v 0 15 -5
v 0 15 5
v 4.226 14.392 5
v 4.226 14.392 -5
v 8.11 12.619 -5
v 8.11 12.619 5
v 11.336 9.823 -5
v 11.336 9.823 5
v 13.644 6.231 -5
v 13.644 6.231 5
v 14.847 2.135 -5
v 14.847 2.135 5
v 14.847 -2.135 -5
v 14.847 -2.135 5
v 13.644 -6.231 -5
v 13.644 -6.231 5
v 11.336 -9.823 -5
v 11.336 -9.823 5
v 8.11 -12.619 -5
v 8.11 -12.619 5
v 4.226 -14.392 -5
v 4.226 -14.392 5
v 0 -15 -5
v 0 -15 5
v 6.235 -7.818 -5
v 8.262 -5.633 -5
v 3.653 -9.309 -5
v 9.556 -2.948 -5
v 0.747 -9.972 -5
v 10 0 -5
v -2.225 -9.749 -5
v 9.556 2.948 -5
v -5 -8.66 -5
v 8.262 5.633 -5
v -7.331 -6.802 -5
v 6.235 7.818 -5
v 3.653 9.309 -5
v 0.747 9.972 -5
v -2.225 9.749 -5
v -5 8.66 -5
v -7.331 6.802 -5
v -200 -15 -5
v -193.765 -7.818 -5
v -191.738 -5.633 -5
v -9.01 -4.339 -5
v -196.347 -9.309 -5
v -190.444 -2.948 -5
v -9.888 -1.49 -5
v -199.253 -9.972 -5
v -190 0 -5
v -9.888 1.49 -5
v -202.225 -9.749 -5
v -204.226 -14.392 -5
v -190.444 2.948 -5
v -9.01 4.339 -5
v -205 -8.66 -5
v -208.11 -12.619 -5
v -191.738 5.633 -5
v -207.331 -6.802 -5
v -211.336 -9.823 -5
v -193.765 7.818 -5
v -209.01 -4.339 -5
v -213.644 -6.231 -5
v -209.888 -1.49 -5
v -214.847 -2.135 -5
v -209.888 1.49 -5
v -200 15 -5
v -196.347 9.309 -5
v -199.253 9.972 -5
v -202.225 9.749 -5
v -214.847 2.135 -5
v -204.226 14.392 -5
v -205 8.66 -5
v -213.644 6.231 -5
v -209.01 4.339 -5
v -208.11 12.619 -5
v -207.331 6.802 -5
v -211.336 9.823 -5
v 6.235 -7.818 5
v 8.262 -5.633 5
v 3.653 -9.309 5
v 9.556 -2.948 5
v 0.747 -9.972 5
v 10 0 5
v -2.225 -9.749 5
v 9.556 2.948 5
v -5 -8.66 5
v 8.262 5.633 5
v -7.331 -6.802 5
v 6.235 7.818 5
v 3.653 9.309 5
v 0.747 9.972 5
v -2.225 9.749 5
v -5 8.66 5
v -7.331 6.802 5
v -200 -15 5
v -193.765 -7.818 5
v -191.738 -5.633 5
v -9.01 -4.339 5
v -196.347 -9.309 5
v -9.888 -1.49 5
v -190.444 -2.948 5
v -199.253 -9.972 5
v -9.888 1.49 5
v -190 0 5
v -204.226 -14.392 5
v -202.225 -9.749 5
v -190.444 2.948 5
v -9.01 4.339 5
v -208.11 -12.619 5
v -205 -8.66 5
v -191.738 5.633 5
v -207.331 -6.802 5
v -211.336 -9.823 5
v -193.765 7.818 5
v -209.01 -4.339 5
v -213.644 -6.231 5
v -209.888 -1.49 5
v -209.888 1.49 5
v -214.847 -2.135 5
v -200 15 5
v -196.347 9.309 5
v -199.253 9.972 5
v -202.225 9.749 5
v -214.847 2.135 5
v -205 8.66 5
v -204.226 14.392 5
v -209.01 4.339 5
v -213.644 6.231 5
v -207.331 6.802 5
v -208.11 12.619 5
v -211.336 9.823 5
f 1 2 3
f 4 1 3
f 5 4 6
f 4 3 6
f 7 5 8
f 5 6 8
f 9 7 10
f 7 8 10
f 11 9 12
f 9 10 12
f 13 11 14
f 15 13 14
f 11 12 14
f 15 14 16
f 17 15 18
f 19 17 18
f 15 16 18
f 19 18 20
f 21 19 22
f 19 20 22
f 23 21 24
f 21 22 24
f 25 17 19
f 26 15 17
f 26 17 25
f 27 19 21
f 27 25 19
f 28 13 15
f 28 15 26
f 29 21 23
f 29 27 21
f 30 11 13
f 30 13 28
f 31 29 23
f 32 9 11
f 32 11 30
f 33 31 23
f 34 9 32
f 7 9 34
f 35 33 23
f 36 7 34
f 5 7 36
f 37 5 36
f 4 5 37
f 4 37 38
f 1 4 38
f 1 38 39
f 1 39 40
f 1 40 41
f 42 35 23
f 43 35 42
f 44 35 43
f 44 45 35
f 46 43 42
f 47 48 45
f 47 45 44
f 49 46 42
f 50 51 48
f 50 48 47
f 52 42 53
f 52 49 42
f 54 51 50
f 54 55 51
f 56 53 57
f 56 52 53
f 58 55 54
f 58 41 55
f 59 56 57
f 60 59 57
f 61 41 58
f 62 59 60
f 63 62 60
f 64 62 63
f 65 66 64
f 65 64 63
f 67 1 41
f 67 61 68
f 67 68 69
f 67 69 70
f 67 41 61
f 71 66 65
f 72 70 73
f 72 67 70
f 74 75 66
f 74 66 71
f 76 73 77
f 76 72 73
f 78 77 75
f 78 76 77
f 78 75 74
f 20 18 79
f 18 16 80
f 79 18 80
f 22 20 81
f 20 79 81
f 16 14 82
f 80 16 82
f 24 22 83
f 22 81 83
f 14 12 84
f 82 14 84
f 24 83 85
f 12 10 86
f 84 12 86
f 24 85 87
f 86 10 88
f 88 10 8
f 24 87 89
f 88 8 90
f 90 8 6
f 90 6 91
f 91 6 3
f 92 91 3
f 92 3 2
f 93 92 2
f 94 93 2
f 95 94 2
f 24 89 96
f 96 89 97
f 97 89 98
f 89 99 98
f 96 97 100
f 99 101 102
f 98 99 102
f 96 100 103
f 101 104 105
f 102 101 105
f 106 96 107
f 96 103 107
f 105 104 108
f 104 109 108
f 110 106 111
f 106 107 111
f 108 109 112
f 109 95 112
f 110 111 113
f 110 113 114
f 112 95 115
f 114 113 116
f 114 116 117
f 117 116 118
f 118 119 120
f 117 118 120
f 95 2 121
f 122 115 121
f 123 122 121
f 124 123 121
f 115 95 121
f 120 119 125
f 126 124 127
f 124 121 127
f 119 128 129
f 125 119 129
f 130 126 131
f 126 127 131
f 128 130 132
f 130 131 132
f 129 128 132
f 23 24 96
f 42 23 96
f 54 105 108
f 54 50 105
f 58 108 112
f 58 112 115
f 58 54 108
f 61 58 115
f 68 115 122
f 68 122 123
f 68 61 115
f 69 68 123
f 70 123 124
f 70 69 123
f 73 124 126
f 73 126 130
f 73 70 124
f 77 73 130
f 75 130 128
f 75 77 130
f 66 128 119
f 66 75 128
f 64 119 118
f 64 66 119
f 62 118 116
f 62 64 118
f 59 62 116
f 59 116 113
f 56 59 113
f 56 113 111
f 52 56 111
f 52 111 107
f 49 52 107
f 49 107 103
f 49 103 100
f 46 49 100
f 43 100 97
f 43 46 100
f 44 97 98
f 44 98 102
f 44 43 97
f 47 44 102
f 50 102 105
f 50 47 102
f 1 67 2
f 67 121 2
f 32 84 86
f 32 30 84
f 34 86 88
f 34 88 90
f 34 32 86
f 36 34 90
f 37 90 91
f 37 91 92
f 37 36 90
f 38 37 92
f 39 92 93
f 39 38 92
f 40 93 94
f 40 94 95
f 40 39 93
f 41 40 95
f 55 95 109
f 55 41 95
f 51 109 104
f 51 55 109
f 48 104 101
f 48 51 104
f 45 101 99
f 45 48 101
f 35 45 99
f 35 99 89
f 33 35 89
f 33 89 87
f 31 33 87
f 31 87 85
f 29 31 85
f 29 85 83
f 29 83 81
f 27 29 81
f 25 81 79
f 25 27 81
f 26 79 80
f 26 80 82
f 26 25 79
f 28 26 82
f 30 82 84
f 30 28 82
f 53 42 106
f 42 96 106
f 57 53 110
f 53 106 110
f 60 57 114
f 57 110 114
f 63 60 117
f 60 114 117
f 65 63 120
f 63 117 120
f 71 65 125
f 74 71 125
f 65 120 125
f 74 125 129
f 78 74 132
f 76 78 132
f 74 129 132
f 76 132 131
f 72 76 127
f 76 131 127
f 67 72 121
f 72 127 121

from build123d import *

# Parameters (mm, degrees)
ESQUISSE1_R        = 10
BOSS_EXTRU_1_DEPTH = 5


with BuildPart() as part:
    # Esquisse1 → Boss.-Extru.1 (new, symmetric)
    with BuildSketch(Plane.XY):
        with BuildLine():
            Line((0, -15), (-200, -15))
            ThreePointArc((-200, -15), (-215, 0), (-200, 15))
            Line((-200, 15), (0, 15))
            ThreePointArc((0, 15), (15, 0), (0, -15))
        make_face()
        with Locations((-200, 0)):
            Circle(ESQUISSE1_R, mode=Mode.SUBTRACT)
        Circle(ESQUISSE1_R, mode=Mode.SUBTRACT)
    extrude(amount=BOSS_EXTRU_1_DEPTH, both=True)


solid = part.part
